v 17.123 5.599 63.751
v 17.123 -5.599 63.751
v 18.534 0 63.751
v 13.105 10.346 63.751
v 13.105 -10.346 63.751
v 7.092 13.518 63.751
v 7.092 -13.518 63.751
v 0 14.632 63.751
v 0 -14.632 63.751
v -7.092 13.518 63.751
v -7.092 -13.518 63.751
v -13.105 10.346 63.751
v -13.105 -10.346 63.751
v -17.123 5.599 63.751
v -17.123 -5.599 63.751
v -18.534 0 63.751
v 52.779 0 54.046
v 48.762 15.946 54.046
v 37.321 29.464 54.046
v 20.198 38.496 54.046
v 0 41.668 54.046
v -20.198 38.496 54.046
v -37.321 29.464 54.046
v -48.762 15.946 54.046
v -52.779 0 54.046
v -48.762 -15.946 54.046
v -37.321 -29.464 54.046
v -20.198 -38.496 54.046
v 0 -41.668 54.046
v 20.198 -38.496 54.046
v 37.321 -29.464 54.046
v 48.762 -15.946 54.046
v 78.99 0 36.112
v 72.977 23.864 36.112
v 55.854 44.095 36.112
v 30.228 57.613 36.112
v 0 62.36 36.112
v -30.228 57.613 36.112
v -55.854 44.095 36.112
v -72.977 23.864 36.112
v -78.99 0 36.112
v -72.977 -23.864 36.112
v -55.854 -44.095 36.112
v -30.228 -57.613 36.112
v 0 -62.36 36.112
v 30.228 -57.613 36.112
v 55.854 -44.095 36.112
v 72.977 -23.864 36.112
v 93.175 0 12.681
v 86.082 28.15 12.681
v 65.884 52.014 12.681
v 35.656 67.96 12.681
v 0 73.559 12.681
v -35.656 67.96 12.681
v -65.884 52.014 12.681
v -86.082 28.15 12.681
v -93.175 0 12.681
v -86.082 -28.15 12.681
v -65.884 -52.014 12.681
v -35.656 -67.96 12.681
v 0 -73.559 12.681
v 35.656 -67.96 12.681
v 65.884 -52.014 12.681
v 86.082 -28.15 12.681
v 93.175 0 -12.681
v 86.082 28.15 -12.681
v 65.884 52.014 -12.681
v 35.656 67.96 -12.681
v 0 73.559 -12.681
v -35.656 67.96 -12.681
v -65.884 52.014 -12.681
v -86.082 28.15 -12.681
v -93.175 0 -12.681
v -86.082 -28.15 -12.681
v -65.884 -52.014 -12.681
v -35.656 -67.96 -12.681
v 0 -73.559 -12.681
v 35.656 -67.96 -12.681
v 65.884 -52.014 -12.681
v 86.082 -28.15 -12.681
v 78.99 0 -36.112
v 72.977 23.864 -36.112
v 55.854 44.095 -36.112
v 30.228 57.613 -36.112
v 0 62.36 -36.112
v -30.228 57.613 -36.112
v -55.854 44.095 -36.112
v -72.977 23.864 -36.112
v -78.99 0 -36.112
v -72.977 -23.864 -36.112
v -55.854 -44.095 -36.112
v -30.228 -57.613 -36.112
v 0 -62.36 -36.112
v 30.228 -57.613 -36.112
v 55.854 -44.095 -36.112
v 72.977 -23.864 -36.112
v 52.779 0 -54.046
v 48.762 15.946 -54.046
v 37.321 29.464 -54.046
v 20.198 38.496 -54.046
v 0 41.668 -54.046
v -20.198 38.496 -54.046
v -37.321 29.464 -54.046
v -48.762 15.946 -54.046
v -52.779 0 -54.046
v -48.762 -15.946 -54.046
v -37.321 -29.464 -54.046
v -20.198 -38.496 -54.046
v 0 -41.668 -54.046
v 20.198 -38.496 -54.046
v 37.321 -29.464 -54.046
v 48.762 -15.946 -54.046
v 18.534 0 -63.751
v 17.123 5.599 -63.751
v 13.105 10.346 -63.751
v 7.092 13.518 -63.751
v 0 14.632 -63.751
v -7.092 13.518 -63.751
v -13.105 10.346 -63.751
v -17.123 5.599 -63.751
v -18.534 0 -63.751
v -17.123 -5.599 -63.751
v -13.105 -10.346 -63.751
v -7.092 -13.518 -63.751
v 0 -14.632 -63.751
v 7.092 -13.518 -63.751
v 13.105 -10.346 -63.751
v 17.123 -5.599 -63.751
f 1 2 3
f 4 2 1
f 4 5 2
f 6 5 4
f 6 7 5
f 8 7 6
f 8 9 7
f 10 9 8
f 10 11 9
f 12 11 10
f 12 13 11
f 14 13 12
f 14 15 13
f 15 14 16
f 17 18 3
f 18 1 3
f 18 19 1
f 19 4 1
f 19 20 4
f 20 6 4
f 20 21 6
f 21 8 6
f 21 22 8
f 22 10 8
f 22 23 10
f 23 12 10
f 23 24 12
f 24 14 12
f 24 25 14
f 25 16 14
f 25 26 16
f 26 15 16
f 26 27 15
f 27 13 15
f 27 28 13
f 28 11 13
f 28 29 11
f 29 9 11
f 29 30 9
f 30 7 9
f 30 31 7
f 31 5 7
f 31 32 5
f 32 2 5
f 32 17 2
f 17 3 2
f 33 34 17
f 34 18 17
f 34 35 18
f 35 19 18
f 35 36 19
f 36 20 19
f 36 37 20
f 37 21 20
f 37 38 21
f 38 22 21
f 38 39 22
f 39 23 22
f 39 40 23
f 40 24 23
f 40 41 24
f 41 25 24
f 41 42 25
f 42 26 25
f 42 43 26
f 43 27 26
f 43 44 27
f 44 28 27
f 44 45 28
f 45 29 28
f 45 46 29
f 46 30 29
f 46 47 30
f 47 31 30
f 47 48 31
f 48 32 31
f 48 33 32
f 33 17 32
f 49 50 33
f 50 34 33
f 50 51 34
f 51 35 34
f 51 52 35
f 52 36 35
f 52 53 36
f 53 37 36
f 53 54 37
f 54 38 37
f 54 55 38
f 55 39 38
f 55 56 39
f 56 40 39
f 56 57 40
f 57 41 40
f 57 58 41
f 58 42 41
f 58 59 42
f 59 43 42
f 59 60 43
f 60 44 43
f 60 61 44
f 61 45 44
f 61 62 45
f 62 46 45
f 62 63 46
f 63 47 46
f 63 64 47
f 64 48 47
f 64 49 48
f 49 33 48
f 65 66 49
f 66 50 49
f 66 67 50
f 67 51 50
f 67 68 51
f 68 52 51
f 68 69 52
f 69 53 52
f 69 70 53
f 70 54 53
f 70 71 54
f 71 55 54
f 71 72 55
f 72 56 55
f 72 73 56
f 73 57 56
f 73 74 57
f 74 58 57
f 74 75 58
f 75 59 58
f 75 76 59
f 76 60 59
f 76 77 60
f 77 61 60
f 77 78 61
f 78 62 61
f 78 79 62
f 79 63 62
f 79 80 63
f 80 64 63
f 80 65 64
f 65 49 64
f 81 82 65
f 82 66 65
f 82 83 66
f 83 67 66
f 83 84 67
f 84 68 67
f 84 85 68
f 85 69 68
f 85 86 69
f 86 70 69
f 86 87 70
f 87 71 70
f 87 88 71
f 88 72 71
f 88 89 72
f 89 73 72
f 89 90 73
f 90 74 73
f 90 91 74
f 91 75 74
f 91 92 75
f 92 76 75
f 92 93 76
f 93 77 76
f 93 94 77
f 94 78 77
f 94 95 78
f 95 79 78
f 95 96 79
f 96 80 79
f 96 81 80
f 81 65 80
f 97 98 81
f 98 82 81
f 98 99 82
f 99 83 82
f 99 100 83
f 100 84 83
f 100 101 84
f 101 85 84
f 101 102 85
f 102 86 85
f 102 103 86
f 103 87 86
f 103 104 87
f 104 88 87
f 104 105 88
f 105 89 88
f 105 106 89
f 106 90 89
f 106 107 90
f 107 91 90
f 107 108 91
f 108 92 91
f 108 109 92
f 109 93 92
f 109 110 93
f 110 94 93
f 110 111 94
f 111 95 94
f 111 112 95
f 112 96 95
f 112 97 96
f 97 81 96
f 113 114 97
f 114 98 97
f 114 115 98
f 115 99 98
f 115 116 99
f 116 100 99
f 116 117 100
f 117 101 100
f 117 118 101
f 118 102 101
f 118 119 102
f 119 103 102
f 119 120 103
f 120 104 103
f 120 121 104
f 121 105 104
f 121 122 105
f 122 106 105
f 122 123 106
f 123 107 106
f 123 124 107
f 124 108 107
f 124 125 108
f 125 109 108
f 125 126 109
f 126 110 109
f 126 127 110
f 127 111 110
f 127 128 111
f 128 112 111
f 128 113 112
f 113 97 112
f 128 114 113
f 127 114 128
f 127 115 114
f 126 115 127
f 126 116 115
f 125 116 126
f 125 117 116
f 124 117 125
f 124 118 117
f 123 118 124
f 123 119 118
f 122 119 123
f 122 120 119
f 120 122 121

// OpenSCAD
// Generated by SolidPython 1.0.1 on 2020-07-29 00:46:54


scale(v = [19, 15, 13]) {
	sphere(r = 5);
}
/***********************************************
*********      SolidPython code:      **********
************************************************
 
# import packages: SolidPython
from solid import *
from solid.utils import *
from itertools import chain, combinations, permutations


class Resize:

    def __init__(self, scad_file):
        self.scad_file = scad_file
        #self.scad_file = import_scad(scad_file)
        # cone/cylinder param:
        self.r1 = 0
        self.r2 = 0
        self.h = 0
        # rectangular prism param:
        self.w = 0
        self.l = 0
        # ellipse param:
        self.r = 0

    # import OpenScad code (file name corresponds to shape)


    # classify shape + parameters
    def assign(self, param1, param2, param3):
        if self.scad_file == 'cone.scad':
            self.r1 = param1
            self.r2 = param2
            self.h = param3
        elif self.scad_file == 'cylinder.scad':
            self.r1 = param1
            self.r2 = param2
            self.h = param3
        elif self.scad_file == 'rectangularPrism.scad':
            self.h = param1
            self.l = param2
            self.w = param3
        else:
            self.r = param1
            self.h = param2

    # resize parameters
    def iterate(self):
        x = range(3, 20, 2)
        i = 1
        if self.scad_file == 'cone.scad':
            tempList = list(permutations(x, 2))
            for temp in tempList:
                param1 = temp[0]
                param2 = temp[1]
                filepath = 'produced_scad_files/' + 'cone' + str(param1) + '_' + str(param2) + '_' + '.scad'
                scad_render_to_file(cylinder(h=param1, r1=param2, r2=0), filepath)

        elif self.scad_file == 'cylinder.scad':
            tempList = list(permutations(x, 3))
            for temp in tempList:
                param1 = temp[0]
                param2 = temp[1]
                filepath = 'produced_scad_files/' + 'cylinder' + str(param1) + '_' + str(param2) + '_' + '.scad'
                scad_render_to_file(cylinder(h=param1, r1=param2, r2=param2), filepath)

        elif self.scad_file == 'rectangularPrism.scad':
            tempList = list(permutations(x, 3))
            for temp in tempList:
                param1 = temp[0]
                param2 = temp[1]
                param3 = temp[2]
                filepath = 'produced_scad_files/' + 'rectangularPrism' + str(param1) + '_' + str(param2) + '_' + str(
                    param3) + '.scad'
                scad_render_to_file(cube(size=(param1, param2, param3)), filepath)

        elif self.scad_file == 'ellipse.scad':
            tempList = list(permutations(x, 4))
            for temp in tempList:
                param1 = temp[0]
                param2 = temp[1]
                param3 = temp[2]
                param4 = temp[3]
                filepath = 'produced_scad_files/' + 'ellipse' + str(param1) + '_' + str(param2) + '_' + str(param3) + '_' + str(param4) + '.scad'
                scad_render_to_file(scale([param1, param2, param3])(sphere(r=param4)), filepath)

    def render_to_scadfile(self):
        scad_render_to_file(scad, 'example.scad') 
 
************************************************/
